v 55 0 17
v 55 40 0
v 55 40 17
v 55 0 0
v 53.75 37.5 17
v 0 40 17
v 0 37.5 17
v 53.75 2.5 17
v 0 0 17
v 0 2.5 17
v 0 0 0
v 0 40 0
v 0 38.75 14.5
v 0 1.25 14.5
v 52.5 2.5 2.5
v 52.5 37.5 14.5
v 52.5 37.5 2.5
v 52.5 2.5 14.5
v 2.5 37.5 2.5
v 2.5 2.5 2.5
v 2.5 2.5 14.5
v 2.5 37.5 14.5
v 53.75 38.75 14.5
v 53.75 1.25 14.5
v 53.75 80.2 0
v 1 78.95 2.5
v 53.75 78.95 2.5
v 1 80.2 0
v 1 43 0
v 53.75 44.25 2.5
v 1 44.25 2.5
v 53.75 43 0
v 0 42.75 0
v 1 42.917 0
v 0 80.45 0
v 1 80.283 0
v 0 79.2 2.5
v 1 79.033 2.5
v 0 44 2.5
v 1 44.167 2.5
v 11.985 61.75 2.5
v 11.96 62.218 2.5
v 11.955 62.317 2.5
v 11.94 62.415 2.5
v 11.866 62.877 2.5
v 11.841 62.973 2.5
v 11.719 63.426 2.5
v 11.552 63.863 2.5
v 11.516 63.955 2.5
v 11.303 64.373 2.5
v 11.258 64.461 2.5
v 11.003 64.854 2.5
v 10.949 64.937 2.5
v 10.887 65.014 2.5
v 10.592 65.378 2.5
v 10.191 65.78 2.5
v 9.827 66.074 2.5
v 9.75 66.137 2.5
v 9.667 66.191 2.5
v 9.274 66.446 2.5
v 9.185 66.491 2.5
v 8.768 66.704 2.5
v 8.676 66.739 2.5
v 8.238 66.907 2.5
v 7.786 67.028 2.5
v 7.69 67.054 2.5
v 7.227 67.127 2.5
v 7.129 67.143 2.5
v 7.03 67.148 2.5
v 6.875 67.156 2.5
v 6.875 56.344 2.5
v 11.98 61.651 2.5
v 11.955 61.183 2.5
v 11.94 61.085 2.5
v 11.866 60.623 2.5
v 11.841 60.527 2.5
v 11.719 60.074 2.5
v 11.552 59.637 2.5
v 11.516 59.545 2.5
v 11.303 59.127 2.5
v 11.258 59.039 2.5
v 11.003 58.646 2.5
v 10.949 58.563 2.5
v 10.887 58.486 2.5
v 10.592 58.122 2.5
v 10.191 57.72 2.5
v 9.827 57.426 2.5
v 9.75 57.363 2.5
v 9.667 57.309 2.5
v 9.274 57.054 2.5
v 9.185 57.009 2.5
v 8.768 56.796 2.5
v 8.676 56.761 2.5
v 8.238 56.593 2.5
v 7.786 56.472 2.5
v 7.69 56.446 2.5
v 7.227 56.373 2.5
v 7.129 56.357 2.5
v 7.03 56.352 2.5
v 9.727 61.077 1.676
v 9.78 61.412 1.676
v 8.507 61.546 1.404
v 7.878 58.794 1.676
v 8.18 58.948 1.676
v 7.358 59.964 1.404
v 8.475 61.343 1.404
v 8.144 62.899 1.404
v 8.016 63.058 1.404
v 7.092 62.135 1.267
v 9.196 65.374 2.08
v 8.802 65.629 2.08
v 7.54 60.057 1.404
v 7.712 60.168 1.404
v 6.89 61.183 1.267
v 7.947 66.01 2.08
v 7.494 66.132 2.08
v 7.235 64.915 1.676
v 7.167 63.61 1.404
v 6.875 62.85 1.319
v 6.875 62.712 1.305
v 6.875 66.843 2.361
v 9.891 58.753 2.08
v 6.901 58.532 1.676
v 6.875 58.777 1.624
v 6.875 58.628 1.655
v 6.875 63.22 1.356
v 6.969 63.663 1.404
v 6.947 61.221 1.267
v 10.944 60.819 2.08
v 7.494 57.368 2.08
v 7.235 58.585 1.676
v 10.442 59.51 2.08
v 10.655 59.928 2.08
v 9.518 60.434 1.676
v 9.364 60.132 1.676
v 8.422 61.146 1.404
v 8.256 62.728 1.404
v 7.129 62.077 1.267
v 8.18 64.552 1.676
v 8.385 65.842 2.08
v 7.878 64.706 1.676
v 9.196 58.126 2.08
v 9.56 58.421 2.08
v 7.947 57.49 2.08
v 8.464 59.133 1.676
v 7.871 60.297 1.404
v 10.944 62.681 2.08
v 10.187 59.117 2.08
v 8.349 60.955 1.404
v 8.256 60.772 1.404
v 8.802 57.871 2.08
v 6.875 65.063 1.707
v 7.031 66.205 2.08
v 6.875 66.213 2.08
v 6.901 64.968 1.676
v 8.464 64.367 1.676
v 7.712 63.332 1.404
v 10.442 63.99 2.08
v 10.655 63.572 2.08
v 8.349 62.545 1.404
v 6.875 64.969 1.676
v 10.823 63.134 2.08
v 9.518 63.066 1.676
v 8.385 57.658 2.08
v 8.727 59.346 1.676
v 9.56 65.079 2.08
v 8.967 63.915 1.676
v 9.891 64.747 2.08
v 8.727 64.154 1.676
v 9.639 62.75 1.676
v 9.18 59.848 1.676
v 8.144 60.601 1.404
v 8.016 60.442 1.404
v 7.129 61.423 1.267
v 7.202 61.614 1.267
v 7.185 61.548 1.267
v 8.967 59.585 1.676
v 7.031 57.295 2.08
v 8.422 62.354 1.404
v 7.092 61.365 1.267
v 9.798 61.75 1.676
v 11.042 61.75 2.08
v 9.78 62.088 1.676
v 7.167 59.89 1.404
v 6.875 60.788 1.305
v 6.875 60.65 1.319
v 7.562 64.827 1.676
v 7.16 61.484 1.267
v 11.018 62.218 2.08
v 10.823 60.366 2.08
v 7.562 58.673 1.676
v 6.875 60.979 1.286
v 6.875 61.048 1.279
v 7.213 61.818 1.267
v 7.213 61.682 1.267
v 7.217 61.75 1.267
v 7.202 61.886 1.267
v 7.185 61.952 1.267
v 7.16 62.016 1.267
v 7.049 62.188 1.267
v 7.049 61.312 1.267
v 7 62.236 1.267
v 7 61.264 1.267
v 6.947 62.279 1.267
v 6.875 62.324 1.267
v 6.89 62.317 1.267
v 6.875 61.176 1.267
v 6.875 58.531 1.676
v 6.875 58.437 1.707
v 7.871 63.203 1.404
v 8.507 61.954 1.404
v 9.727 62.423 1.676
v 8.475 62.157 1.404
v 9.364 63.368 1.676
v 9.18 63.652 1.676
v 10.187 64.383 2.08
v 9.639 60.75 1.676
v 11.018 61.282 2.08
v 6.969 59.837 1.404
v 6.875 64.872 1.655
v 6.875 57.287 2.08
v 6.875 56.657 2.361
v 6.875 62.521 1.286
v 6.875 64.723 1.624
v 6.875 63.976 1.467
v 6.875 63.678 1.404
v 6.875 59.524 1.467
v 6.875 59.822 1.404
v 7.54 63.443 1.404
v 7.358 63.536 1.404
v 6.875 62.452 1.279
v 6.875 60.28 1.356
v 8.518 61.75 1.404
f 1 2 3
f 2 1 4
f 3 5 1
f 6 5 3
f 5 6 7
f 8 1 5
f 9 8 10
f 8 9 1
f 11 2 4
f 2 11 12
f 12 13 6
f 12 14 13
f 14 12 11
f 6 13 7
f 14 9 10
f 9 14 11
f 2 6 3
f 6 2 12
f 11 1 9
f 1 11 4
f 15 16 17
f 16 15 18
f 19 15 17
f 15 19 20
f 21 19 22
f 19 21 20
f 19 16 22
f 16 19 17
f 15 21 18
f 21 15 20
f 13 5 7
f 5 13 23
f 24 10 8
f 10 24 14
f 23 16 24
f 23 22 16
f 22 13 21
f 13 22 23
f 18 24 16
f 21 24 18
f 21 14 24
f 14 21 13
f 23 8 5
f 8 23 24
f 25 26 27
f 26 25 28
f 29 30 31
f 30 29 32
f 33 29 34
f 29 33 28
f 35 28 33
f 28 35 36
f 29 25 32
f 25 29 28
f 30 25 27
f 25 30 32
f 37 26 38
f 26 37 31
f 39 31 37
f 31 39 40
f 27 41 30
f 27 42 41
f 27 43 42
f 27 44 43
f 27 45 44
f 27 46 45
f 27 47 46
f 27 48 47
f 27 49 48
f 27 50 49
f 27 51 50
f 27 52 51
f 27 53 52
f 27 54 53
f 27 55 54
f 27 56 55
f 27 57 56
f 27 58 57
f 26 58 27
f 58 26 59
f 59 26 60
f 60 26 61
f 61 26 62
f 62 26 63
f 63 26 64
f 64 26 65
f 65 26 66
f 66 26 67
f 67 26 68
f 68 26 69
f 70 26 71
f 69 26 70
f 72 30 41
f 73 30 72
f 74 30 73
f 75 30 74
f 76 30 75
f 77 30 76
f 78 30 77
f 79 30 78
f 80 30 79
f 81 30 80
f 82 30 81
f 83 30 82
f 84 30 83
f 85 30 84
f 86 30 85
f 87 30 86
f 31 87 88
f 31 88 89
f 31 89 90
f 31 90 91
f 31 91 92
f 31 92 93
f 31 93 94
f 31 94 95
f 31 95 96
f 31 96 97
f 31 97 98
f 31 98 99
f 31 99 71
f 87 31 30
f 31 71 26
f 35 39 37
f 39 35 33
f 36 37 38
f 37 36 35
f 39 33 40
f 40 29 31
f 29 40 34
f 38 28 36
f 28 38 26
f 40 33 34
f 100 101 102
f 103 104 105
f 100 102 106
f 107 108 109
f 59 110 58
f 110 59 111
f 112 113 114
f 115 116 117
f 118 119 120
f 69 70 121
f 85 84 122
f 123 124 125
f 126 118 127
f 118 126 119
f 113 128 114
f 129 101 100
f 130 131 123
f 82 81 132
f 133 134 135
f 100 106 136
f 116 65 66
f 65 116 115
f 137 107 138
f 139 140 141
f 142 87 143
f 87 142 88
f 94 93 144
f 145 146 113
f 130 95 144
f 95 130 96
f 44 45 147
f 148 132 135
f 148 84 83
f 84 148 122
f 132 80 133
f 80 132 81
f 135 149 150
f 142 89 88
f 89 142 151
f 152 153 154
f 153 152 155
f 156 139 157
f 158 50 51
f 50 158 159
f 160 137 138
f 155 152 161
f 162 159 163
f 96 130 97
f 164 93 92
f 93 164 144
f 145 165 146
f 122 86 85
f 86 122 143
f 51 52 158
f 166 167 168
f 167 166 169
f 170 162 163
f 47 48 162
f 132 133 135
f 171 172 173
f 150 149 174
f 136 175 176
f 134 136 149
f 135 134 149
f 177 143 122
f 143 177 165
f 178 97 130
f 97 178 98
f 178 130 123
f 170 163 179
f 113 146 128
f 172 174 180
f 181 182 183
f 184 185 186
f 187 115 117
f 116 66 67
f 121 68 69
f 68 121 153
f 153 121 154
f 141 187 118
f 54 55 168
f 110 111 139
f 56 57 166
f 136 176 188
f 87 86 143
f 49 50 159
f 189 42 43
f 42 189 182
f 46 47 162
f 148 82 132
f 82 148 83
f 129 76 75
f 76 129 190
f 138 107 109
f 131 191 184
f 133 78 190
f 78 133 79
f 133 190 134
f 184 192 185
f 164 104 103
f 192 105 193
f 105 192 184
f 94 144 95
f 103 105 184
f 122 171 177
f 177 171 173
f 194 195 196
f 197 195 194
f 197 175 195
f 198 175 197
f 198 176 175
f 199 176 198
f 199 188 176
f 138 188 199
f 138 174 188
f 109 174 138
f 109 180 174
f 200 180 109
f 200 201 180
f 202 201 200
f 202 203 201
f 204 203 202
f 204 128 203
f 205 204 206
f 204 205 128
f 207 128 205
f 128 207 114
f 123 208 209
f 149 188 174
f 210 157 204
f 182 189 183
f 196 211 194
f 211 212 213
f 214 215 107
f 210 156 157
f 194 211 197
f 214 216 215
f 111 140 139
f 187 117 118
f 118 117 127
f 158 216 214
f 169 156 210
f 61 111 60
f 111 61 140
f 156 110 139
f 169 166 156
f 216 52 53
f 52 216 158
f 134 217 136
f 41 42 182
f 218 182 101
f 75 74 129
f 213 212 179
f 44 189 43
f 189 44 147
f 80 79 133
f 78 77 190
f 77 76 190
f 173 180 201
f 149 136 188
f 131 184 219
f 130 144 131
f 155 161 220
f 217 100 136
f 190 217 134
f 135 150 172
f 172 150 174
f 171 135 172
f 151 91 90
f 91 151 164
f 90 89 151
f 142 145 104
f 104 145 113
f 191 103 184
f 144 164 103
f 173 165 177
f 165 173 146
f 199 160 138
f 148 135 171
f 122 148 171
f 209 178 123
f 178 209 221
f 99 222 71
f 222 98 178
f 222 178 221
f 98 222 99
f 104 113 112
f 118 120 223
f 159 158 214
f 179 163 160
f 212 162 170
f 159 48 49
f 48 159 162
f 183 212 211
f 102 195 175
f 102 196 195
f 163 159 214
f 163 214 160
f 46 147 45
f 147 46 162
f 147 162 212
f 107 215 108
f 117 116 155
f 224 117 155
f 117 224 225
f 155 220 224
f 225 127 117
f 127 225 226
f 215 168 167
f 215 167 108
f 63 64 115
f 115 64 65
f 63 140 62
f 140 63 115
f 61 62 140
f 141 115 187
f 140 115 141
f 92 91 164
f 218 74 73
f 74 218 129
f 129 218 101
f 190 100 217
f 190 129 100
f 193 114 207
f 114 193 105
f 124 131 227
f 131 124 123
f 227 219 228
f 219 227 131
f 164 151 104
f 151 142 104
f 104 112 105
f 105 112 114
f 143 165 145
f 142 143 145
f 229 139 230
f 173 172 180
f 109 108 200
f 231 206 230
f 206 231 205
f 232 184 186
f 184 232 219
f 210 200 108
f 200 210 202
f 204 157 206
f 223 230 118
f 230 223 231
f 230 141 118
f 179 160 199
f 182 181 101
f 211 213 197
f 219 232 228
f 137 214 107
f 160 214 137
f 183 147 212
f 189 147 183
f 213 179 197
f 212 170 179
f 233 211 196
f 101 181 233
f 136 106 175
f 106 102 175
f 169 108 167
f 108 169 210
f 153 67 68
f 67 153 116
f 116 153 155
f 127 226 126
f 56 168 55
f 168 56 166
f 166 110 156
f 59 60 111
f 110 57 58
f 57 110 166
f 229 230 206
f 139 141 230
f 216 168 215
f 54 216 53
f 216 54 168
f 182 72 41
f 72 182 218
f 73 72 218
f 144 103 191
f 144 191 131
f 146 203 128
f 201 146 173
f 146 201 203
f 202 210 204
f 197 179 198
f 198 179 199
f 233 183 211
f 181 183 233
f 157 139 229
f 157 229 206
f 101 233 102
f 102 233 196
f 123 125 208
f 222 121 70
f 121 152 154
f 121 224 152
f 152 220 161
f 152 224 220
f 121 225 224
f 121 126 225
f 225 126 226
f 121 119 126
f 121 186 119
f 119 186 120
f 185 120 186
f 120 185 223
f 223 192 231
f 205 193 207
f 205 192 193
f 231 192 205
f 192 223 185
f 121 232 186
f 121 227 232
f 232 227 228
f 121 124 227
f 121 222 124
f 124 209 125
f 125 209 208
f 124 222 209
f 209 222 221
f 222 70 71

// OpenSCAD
// Download both files into the same directory and make a copy of this template for each project. Adjust the variables and values as needed to override the defaults in this file as needed. In this way you can replace the `Ultimate_Box_Generator.scad` file with a new version without having to track and restore your changes.

// If you want to use any framework variables in calulations you must import them here. If you want to also change the variable you must use a second line below to do that.
wall=wall;
internal_wall=internal_wall;

// Include the framework. You can change the prefix to load from a shared path.
include    <Ultimate_Box_Generator.scad>;

// At this point you can start to adjust builtin varaibles and create your own. There are also some examples of more complex boxes at the end of the file.


// Parts to render. To do more complex opperations disable these and manually call make_box() and make_lid() instead.
show_box=true;	// Whether or not to render the box
show_lid=true;	// Whether or not to render the lid. To make open boxes with no lid set `show_lid=false` and `lid_type=5`.

// General Settings
//comp_size_deep = 12; // Depth of compartments
//comp_size_x = 50;	 // Size of compartments, X
//comp_size_y = 35;	 // Size of compartments, Y
//wall = 2.5;		    // Width of wall, see `internal_wall` below for alternate inner wall size.
//repeat_x = 1;		// Number of compartments, X
//repeat_y = 1;		// Number of compartments, Y
//tolerance=.15;      // Tolerance around lid.  If it's too tight, increase this. If it's too loose, decrease it.

// Box Rounding
//box_corner_radius=0; // Add a rounding affect to the corners of the box. Anything over `wall` will cause structure and lid problems.
//internal_corner_radius=0; // Add a rounding affect to the inside.
//mesh_corner_radius=0; // Leave a radius around each corner of the mesh. May hep with bridges.
//corner_fn=30;

// Supress individual walls.
//supress_walls_x=[]; // These are the walls running along the X axis. It should be an array of size [repeat_y-1][repeat_x].
//supress_walls_y=[]; // These are the walls running along the Y axis. It should be an array of size [repeat_x-1][repeat_y].
// Example for repeat_x=4, repeat_y=3:
//supress_walls_x=[[1,0,1,1],[0,1,0,1]];
//supress_walls_y=[[1,0,1],[0,1,1],[1,1,1]];
//supress_sides=false; // [X, Y, X, Y] Cutout/supress some sides. this may behave baddly with compartments or mesh.
//supress_sides_radius=wall; // Add a rounding to the cutout.
//supress_sides_offset=0; // 0, wall, [X, Y, Z] adjsut the coutout in all directions. + to grow, - so shrink
//supress_sides_fn=30;

// Mesh Settings
// To make rounded corners and no mesh use any `mesh_type` > 0 and set `strut_gap` to a high value.
// 0: No mesh, solid wall.
// 1: Single direction mesh.
// 2: Two direction cross mesh and 90 degree angle to eachother.
// 3: Two direction mesh but mirrored around 90 axsis instead or rotated 90 degrees.
// 4: Calculate angle across the diagonal of each opening. You will also want to change `strut_gap` to a large number and set `strut_count_min=1`.
// 5: No mesh, empty wall.
// 6: Honycomb. Also set `strut_width=wall/4` and `strut_gap=wall*2`. To big of a `strut_gap` may fail to print. Other shapes can be generated with `mesh_fn` and reducing `mesh_inset_padding` may help.
//mesh_type=0; // Mesh type, see above.
//mesh_rotation=0; // 0-90 degrees.
//mesh_alt_rotation=mesh_rotation; // Alternate rotation for top and bottom faces.
//mesh_do_sides=true; //[true, true, true, false] Include mesh on each side along axis. [X, Y, X, Y]
//mesh_do_bottom=false; // Include mesh on bottom plate.
//mesh_do_top=true; // Include mesh on top piece.
//mesh_do_interior=false; // Include mesh on inner walls.
//mesh_inset_padding=wall; // Leave some solid material before building strut frame. Anything less then wall/2 will likely fall apart.
//mesh_fn=mesh_type == 6 ? 6 : 40; // Complexity of curves in mesh's, increese for smoother curves.
//strut_width=wall*2; // Width of each strut, 0=hollow.
//strut_gap=wall; // Width of the air gap between each strut. 0=fine air gaps.
//strut_count_min=0; // Optinal minimum number of struts regardless of size calulations.
//alt_strut_width=strut_width; // Width of struts going the other directions.
//alt_strut_gap=strut_gap; // Width of gap going the other direction.
//alt_strut_count_min=strut_count_min; // Optinal minimum number of struts regardless of size calulations.
//mesh_overflow=0; // Extra rows to add to the mesh. For example in the Honeycomb partial hexegons will be created along the edges.

// Lid Settings
// 0: No Lid. top may be rounded and can cause other rendering changes.
// 1: Lid that slides off in the x direction.
// 2: Lid with a snapped in hinge that rotates open
// 3: Lid that snaps down onto the box. Also need to change lid_height to around 1.5mm.
// 4: Stackable version of cover 1 there boxes slide into one another. You will need one cover for the last box. (Not tested)
// 5: Oversized lid sits on top and has sides that extend down. (Needs snapp support)
//lid_type=1; // Lid type, see above.
//has_thumbhole=true; // Add gripping locations for easy opening.
//has_coinslot=false; // Add slot in the top for dropping in components.
//has_snap=true; // Add small ridges or snaps to lids to help keep them closed.
//coinslot_x=20;	// Size in X direction
//coinslot_y=2.5;	// Size in Y direction
//coinslot_corner_radius=0; // rounded coinslot corners if >0; best if less than half the shorter coinslot dimension
//z_tolerance=0;   // Z tolerance can be tweaked separately, to make the top of the sliding lid be flush with the top of the box itself.
//extra_bottom=.15; // Extra bottm wall height to fit type 4 slider.
//hinge_inset=.75; // Size of the hinge connection.
//snap_inset=.25; // Amount of overhang for snaps to snap into place.
//snap_tolerance=tolerance; // You may need to add tolerance around lid and snaps to let them move freely.
//lid_offset=3;		// This is how far away from the box to print the lid
//lid_height=wall*2;  // Height of lid. Must be greater than wall width for a `lid_type=5` lid to work. On Lid 3 is the depth of the inset snap.
//lid_fn=40; // Increese if printing thicker walls.
//lid_alt_offset=false; // Move lid in X instead of Y for printing.

//Internal Structure (You may need to turn off `mesh_do_sides` or `mesh_do_bottom` for good results.)
// You can also use `make_wall()` to manually add your own walls.
// 1: Rounded bottom frame.
// 2: Hexegon bottom frame. (To make this shape perfect set `comp_size_deep` to the width between to edges of the tile and set `comp_size_x` or `comp_size_y` to this this: `comp_size_deep / sqrt(3)*2`.
// 3: Rough bottom for make bits sit unevenly. (Partial)
// 4: Verical rounding on cordner. Set `internal_size_deep` to `comp_size_deep` and `internal_size_circle` to the shortest `comp_size` for a circle.
// 5: Vertical hexegon. Retulst may varry.
//internal_type=0; // Internal structure, see above.
//internal_rotate=false; // On lid axis or rotate to opposite.
//internal_size_deep=comp_size_deep/2; // How far into the box to start the internal structure. Should be `comp_size_deep/2` for type 1-2, `wall` for 3, or comp_size_deep for type 4-5.
//internal_size_circle=internal_type==1 ? internal_size_deep : internal_size_deep * 2 / sqrt(3); // Use this calculation, or the shorter comp_size for type 4-5.
//internal_fn=internal_type==1 || internal_type==4 ? 60 : 6; // Complexity of internal curves, may need to increase for larger or smoother curves.
//internal_wall=wall; // Custom size for internal walls.
//internal_wall_deep=comp_size_deep; // If set to lower then comp_size_deep then the internal walls will be this tall.

// Text Settings
// 0: None.
// 1: Cutout. Remove material formt he wall.
// 2: Raised. If a mesh is ued part of it is filled in to hold the text. Lids 0 and 3 are printed upside down by default. With this option used they will require supports regardless of the orrientation printed.
//text_type=0; // Text type, see above.
//text_depth=wall/6; // Distance to cutout text or raise it. User `wall` to cut through.
//text_size=5; // Font Size.
//text_font="Courier New:style=Bold"; // Use Hepl -> Font List to see options.
//text_message="Red Player"; // Message Text, or use `["Line 1", "Line 2"]` for multiline.
//text_message_compartments=false;//[["AA", "BB", "CC"], ["AB", "BC", "CD"]]; // Custom text for compartments in top or bottom. Also support multiline as `[[ ["A", "B"] ]]`.
//text_sides=true;//[true, true, true, false]; // Sides to put text on, [X, Y, X, Y]
//text_top=true; // Put Text on the top.
//text_bottom=false; // Put Text on the bottom.
//text_rotation=0; // Rotate the top and bottom text by X degrees. 90 will rotate from the X axis to the Y axis.
//text_offset=0; // Text is verticaly centered in the wall. This may look "off" due to casing or hanging tails. You can manually adjust the vertical alignment with this setting.
//text_fn=30; // Complexity of the letters, may need to increese with larger fonts.
//text_backdrop_scale=[.9, 1.5]; // Font size scaleing used on the backdrop when `text_type=2` is used on sides with a mesh.

// Complex Structure
//make_complex_box=false; // Use an array of objects from `complex_box` to create many smaller boxes within the larger box.
//internal_grow_down=true; // If set compartments will be extruded into the larger box from the top to make a flush surface. (May make a model that uses a lot of material.
//internal_empty_bottom=false; // If set the area blow each box will be empty. This will not be printable on a FDM printer unless supports are included internally but still may save material and print time.



// In addition you can set `show_box=false;` and then call `make_box()` manually to join and remove more structure to it like in this example.
/*show_box=false;
difference() {
    make_box();
    translate([0, comp_size_y/2 + wall, 0])
    rotate([0, 90, 0])
    cylinder(comp_size_x +wall*2, 10, 10);
}*/

// You can also use calls to `make_internal_box` to create more complex boxes within a larger box that share a single lid.
/*show_box=false;
make_box();
intersection() {     
    faction_x=10; faction_y=comp_size_y; faction_z=5; faction_repeat_x=3; faction_repeat_y=1;
    faction_size_x=calc_size(faction_repeat_x, faction_x, wall=internal_wall, internal_wall=internal_wall);
faction_size_y=calc_size(faction_repeat_y, faction_y, wall=internal_wall, internal_wall=internal_wall);
    
    translate([wall, wall, wall])
    cube([faction_size_x - wall, faction_size_y - wall*2, comp_size_deep]);
            
    translate([wall-internal_wall, wall-internal_wall, wall-internal_wall])
    union() {
        translate([0, 0, 0])
        make_internal_box(faction_x, faction_y, faction_z, wall=internal_wall, repeat_x=faction_repeat_x, repeat_y=faction_repeat_y);
    }
}*/

// This exmaple wil make a complex series of boxes in a larger container. The object's can be used to position other oebjects and create internal structure.
/*comp_size_x = 200;
comp_size_y = 200;
comp_size_deep = 200;

internal_wall=wall/2;

comp1=make_object(x=10, y=30, z=45, offset_x=0, offset_y=0, repeat_x=3, repeat_y=1, color="Red");
comp2=make_object(x=35, y=40, z=45, offset_x=comp1[4][0], offset_y=0, repeat_x=1, repeat_y=1, color="Pink");
comp3=make_object(x=35, y=30, z=45, offset_x=comp2[4][0], offset_y=0, repeat_x=1, repeat_y=1, color="Orange");
comp4=make_object(x=150, y=100, z=75, offset_x=0, offset_y=comp1[4][1], repeat_x=1, repeat_y=1, color="Blue");

complex_box=[
    comp1, comp2, comp3, comp4,
    
];
make_complex_box=true;*/

// Some notes on complex prints:
/* OpenSCAD expereicne is required to do pretty much any type of customization or complex opperations. This will essentaily jsut make the containers within one larger object with a single lid. Alternatly multiple boxes could be reated and then joined together with translations to make a larger object with multiple lids. 
   Due to how variables are passed in OpenSCAD it can be tricky to get the parameters set on the parent box and child boxes as you want. It is best to use global variable assignmets to set the child box parameters, then pass overrides to the `make_box()` call yourself. (You have to also set `show_box=false;` if you ddo this.)
  */
